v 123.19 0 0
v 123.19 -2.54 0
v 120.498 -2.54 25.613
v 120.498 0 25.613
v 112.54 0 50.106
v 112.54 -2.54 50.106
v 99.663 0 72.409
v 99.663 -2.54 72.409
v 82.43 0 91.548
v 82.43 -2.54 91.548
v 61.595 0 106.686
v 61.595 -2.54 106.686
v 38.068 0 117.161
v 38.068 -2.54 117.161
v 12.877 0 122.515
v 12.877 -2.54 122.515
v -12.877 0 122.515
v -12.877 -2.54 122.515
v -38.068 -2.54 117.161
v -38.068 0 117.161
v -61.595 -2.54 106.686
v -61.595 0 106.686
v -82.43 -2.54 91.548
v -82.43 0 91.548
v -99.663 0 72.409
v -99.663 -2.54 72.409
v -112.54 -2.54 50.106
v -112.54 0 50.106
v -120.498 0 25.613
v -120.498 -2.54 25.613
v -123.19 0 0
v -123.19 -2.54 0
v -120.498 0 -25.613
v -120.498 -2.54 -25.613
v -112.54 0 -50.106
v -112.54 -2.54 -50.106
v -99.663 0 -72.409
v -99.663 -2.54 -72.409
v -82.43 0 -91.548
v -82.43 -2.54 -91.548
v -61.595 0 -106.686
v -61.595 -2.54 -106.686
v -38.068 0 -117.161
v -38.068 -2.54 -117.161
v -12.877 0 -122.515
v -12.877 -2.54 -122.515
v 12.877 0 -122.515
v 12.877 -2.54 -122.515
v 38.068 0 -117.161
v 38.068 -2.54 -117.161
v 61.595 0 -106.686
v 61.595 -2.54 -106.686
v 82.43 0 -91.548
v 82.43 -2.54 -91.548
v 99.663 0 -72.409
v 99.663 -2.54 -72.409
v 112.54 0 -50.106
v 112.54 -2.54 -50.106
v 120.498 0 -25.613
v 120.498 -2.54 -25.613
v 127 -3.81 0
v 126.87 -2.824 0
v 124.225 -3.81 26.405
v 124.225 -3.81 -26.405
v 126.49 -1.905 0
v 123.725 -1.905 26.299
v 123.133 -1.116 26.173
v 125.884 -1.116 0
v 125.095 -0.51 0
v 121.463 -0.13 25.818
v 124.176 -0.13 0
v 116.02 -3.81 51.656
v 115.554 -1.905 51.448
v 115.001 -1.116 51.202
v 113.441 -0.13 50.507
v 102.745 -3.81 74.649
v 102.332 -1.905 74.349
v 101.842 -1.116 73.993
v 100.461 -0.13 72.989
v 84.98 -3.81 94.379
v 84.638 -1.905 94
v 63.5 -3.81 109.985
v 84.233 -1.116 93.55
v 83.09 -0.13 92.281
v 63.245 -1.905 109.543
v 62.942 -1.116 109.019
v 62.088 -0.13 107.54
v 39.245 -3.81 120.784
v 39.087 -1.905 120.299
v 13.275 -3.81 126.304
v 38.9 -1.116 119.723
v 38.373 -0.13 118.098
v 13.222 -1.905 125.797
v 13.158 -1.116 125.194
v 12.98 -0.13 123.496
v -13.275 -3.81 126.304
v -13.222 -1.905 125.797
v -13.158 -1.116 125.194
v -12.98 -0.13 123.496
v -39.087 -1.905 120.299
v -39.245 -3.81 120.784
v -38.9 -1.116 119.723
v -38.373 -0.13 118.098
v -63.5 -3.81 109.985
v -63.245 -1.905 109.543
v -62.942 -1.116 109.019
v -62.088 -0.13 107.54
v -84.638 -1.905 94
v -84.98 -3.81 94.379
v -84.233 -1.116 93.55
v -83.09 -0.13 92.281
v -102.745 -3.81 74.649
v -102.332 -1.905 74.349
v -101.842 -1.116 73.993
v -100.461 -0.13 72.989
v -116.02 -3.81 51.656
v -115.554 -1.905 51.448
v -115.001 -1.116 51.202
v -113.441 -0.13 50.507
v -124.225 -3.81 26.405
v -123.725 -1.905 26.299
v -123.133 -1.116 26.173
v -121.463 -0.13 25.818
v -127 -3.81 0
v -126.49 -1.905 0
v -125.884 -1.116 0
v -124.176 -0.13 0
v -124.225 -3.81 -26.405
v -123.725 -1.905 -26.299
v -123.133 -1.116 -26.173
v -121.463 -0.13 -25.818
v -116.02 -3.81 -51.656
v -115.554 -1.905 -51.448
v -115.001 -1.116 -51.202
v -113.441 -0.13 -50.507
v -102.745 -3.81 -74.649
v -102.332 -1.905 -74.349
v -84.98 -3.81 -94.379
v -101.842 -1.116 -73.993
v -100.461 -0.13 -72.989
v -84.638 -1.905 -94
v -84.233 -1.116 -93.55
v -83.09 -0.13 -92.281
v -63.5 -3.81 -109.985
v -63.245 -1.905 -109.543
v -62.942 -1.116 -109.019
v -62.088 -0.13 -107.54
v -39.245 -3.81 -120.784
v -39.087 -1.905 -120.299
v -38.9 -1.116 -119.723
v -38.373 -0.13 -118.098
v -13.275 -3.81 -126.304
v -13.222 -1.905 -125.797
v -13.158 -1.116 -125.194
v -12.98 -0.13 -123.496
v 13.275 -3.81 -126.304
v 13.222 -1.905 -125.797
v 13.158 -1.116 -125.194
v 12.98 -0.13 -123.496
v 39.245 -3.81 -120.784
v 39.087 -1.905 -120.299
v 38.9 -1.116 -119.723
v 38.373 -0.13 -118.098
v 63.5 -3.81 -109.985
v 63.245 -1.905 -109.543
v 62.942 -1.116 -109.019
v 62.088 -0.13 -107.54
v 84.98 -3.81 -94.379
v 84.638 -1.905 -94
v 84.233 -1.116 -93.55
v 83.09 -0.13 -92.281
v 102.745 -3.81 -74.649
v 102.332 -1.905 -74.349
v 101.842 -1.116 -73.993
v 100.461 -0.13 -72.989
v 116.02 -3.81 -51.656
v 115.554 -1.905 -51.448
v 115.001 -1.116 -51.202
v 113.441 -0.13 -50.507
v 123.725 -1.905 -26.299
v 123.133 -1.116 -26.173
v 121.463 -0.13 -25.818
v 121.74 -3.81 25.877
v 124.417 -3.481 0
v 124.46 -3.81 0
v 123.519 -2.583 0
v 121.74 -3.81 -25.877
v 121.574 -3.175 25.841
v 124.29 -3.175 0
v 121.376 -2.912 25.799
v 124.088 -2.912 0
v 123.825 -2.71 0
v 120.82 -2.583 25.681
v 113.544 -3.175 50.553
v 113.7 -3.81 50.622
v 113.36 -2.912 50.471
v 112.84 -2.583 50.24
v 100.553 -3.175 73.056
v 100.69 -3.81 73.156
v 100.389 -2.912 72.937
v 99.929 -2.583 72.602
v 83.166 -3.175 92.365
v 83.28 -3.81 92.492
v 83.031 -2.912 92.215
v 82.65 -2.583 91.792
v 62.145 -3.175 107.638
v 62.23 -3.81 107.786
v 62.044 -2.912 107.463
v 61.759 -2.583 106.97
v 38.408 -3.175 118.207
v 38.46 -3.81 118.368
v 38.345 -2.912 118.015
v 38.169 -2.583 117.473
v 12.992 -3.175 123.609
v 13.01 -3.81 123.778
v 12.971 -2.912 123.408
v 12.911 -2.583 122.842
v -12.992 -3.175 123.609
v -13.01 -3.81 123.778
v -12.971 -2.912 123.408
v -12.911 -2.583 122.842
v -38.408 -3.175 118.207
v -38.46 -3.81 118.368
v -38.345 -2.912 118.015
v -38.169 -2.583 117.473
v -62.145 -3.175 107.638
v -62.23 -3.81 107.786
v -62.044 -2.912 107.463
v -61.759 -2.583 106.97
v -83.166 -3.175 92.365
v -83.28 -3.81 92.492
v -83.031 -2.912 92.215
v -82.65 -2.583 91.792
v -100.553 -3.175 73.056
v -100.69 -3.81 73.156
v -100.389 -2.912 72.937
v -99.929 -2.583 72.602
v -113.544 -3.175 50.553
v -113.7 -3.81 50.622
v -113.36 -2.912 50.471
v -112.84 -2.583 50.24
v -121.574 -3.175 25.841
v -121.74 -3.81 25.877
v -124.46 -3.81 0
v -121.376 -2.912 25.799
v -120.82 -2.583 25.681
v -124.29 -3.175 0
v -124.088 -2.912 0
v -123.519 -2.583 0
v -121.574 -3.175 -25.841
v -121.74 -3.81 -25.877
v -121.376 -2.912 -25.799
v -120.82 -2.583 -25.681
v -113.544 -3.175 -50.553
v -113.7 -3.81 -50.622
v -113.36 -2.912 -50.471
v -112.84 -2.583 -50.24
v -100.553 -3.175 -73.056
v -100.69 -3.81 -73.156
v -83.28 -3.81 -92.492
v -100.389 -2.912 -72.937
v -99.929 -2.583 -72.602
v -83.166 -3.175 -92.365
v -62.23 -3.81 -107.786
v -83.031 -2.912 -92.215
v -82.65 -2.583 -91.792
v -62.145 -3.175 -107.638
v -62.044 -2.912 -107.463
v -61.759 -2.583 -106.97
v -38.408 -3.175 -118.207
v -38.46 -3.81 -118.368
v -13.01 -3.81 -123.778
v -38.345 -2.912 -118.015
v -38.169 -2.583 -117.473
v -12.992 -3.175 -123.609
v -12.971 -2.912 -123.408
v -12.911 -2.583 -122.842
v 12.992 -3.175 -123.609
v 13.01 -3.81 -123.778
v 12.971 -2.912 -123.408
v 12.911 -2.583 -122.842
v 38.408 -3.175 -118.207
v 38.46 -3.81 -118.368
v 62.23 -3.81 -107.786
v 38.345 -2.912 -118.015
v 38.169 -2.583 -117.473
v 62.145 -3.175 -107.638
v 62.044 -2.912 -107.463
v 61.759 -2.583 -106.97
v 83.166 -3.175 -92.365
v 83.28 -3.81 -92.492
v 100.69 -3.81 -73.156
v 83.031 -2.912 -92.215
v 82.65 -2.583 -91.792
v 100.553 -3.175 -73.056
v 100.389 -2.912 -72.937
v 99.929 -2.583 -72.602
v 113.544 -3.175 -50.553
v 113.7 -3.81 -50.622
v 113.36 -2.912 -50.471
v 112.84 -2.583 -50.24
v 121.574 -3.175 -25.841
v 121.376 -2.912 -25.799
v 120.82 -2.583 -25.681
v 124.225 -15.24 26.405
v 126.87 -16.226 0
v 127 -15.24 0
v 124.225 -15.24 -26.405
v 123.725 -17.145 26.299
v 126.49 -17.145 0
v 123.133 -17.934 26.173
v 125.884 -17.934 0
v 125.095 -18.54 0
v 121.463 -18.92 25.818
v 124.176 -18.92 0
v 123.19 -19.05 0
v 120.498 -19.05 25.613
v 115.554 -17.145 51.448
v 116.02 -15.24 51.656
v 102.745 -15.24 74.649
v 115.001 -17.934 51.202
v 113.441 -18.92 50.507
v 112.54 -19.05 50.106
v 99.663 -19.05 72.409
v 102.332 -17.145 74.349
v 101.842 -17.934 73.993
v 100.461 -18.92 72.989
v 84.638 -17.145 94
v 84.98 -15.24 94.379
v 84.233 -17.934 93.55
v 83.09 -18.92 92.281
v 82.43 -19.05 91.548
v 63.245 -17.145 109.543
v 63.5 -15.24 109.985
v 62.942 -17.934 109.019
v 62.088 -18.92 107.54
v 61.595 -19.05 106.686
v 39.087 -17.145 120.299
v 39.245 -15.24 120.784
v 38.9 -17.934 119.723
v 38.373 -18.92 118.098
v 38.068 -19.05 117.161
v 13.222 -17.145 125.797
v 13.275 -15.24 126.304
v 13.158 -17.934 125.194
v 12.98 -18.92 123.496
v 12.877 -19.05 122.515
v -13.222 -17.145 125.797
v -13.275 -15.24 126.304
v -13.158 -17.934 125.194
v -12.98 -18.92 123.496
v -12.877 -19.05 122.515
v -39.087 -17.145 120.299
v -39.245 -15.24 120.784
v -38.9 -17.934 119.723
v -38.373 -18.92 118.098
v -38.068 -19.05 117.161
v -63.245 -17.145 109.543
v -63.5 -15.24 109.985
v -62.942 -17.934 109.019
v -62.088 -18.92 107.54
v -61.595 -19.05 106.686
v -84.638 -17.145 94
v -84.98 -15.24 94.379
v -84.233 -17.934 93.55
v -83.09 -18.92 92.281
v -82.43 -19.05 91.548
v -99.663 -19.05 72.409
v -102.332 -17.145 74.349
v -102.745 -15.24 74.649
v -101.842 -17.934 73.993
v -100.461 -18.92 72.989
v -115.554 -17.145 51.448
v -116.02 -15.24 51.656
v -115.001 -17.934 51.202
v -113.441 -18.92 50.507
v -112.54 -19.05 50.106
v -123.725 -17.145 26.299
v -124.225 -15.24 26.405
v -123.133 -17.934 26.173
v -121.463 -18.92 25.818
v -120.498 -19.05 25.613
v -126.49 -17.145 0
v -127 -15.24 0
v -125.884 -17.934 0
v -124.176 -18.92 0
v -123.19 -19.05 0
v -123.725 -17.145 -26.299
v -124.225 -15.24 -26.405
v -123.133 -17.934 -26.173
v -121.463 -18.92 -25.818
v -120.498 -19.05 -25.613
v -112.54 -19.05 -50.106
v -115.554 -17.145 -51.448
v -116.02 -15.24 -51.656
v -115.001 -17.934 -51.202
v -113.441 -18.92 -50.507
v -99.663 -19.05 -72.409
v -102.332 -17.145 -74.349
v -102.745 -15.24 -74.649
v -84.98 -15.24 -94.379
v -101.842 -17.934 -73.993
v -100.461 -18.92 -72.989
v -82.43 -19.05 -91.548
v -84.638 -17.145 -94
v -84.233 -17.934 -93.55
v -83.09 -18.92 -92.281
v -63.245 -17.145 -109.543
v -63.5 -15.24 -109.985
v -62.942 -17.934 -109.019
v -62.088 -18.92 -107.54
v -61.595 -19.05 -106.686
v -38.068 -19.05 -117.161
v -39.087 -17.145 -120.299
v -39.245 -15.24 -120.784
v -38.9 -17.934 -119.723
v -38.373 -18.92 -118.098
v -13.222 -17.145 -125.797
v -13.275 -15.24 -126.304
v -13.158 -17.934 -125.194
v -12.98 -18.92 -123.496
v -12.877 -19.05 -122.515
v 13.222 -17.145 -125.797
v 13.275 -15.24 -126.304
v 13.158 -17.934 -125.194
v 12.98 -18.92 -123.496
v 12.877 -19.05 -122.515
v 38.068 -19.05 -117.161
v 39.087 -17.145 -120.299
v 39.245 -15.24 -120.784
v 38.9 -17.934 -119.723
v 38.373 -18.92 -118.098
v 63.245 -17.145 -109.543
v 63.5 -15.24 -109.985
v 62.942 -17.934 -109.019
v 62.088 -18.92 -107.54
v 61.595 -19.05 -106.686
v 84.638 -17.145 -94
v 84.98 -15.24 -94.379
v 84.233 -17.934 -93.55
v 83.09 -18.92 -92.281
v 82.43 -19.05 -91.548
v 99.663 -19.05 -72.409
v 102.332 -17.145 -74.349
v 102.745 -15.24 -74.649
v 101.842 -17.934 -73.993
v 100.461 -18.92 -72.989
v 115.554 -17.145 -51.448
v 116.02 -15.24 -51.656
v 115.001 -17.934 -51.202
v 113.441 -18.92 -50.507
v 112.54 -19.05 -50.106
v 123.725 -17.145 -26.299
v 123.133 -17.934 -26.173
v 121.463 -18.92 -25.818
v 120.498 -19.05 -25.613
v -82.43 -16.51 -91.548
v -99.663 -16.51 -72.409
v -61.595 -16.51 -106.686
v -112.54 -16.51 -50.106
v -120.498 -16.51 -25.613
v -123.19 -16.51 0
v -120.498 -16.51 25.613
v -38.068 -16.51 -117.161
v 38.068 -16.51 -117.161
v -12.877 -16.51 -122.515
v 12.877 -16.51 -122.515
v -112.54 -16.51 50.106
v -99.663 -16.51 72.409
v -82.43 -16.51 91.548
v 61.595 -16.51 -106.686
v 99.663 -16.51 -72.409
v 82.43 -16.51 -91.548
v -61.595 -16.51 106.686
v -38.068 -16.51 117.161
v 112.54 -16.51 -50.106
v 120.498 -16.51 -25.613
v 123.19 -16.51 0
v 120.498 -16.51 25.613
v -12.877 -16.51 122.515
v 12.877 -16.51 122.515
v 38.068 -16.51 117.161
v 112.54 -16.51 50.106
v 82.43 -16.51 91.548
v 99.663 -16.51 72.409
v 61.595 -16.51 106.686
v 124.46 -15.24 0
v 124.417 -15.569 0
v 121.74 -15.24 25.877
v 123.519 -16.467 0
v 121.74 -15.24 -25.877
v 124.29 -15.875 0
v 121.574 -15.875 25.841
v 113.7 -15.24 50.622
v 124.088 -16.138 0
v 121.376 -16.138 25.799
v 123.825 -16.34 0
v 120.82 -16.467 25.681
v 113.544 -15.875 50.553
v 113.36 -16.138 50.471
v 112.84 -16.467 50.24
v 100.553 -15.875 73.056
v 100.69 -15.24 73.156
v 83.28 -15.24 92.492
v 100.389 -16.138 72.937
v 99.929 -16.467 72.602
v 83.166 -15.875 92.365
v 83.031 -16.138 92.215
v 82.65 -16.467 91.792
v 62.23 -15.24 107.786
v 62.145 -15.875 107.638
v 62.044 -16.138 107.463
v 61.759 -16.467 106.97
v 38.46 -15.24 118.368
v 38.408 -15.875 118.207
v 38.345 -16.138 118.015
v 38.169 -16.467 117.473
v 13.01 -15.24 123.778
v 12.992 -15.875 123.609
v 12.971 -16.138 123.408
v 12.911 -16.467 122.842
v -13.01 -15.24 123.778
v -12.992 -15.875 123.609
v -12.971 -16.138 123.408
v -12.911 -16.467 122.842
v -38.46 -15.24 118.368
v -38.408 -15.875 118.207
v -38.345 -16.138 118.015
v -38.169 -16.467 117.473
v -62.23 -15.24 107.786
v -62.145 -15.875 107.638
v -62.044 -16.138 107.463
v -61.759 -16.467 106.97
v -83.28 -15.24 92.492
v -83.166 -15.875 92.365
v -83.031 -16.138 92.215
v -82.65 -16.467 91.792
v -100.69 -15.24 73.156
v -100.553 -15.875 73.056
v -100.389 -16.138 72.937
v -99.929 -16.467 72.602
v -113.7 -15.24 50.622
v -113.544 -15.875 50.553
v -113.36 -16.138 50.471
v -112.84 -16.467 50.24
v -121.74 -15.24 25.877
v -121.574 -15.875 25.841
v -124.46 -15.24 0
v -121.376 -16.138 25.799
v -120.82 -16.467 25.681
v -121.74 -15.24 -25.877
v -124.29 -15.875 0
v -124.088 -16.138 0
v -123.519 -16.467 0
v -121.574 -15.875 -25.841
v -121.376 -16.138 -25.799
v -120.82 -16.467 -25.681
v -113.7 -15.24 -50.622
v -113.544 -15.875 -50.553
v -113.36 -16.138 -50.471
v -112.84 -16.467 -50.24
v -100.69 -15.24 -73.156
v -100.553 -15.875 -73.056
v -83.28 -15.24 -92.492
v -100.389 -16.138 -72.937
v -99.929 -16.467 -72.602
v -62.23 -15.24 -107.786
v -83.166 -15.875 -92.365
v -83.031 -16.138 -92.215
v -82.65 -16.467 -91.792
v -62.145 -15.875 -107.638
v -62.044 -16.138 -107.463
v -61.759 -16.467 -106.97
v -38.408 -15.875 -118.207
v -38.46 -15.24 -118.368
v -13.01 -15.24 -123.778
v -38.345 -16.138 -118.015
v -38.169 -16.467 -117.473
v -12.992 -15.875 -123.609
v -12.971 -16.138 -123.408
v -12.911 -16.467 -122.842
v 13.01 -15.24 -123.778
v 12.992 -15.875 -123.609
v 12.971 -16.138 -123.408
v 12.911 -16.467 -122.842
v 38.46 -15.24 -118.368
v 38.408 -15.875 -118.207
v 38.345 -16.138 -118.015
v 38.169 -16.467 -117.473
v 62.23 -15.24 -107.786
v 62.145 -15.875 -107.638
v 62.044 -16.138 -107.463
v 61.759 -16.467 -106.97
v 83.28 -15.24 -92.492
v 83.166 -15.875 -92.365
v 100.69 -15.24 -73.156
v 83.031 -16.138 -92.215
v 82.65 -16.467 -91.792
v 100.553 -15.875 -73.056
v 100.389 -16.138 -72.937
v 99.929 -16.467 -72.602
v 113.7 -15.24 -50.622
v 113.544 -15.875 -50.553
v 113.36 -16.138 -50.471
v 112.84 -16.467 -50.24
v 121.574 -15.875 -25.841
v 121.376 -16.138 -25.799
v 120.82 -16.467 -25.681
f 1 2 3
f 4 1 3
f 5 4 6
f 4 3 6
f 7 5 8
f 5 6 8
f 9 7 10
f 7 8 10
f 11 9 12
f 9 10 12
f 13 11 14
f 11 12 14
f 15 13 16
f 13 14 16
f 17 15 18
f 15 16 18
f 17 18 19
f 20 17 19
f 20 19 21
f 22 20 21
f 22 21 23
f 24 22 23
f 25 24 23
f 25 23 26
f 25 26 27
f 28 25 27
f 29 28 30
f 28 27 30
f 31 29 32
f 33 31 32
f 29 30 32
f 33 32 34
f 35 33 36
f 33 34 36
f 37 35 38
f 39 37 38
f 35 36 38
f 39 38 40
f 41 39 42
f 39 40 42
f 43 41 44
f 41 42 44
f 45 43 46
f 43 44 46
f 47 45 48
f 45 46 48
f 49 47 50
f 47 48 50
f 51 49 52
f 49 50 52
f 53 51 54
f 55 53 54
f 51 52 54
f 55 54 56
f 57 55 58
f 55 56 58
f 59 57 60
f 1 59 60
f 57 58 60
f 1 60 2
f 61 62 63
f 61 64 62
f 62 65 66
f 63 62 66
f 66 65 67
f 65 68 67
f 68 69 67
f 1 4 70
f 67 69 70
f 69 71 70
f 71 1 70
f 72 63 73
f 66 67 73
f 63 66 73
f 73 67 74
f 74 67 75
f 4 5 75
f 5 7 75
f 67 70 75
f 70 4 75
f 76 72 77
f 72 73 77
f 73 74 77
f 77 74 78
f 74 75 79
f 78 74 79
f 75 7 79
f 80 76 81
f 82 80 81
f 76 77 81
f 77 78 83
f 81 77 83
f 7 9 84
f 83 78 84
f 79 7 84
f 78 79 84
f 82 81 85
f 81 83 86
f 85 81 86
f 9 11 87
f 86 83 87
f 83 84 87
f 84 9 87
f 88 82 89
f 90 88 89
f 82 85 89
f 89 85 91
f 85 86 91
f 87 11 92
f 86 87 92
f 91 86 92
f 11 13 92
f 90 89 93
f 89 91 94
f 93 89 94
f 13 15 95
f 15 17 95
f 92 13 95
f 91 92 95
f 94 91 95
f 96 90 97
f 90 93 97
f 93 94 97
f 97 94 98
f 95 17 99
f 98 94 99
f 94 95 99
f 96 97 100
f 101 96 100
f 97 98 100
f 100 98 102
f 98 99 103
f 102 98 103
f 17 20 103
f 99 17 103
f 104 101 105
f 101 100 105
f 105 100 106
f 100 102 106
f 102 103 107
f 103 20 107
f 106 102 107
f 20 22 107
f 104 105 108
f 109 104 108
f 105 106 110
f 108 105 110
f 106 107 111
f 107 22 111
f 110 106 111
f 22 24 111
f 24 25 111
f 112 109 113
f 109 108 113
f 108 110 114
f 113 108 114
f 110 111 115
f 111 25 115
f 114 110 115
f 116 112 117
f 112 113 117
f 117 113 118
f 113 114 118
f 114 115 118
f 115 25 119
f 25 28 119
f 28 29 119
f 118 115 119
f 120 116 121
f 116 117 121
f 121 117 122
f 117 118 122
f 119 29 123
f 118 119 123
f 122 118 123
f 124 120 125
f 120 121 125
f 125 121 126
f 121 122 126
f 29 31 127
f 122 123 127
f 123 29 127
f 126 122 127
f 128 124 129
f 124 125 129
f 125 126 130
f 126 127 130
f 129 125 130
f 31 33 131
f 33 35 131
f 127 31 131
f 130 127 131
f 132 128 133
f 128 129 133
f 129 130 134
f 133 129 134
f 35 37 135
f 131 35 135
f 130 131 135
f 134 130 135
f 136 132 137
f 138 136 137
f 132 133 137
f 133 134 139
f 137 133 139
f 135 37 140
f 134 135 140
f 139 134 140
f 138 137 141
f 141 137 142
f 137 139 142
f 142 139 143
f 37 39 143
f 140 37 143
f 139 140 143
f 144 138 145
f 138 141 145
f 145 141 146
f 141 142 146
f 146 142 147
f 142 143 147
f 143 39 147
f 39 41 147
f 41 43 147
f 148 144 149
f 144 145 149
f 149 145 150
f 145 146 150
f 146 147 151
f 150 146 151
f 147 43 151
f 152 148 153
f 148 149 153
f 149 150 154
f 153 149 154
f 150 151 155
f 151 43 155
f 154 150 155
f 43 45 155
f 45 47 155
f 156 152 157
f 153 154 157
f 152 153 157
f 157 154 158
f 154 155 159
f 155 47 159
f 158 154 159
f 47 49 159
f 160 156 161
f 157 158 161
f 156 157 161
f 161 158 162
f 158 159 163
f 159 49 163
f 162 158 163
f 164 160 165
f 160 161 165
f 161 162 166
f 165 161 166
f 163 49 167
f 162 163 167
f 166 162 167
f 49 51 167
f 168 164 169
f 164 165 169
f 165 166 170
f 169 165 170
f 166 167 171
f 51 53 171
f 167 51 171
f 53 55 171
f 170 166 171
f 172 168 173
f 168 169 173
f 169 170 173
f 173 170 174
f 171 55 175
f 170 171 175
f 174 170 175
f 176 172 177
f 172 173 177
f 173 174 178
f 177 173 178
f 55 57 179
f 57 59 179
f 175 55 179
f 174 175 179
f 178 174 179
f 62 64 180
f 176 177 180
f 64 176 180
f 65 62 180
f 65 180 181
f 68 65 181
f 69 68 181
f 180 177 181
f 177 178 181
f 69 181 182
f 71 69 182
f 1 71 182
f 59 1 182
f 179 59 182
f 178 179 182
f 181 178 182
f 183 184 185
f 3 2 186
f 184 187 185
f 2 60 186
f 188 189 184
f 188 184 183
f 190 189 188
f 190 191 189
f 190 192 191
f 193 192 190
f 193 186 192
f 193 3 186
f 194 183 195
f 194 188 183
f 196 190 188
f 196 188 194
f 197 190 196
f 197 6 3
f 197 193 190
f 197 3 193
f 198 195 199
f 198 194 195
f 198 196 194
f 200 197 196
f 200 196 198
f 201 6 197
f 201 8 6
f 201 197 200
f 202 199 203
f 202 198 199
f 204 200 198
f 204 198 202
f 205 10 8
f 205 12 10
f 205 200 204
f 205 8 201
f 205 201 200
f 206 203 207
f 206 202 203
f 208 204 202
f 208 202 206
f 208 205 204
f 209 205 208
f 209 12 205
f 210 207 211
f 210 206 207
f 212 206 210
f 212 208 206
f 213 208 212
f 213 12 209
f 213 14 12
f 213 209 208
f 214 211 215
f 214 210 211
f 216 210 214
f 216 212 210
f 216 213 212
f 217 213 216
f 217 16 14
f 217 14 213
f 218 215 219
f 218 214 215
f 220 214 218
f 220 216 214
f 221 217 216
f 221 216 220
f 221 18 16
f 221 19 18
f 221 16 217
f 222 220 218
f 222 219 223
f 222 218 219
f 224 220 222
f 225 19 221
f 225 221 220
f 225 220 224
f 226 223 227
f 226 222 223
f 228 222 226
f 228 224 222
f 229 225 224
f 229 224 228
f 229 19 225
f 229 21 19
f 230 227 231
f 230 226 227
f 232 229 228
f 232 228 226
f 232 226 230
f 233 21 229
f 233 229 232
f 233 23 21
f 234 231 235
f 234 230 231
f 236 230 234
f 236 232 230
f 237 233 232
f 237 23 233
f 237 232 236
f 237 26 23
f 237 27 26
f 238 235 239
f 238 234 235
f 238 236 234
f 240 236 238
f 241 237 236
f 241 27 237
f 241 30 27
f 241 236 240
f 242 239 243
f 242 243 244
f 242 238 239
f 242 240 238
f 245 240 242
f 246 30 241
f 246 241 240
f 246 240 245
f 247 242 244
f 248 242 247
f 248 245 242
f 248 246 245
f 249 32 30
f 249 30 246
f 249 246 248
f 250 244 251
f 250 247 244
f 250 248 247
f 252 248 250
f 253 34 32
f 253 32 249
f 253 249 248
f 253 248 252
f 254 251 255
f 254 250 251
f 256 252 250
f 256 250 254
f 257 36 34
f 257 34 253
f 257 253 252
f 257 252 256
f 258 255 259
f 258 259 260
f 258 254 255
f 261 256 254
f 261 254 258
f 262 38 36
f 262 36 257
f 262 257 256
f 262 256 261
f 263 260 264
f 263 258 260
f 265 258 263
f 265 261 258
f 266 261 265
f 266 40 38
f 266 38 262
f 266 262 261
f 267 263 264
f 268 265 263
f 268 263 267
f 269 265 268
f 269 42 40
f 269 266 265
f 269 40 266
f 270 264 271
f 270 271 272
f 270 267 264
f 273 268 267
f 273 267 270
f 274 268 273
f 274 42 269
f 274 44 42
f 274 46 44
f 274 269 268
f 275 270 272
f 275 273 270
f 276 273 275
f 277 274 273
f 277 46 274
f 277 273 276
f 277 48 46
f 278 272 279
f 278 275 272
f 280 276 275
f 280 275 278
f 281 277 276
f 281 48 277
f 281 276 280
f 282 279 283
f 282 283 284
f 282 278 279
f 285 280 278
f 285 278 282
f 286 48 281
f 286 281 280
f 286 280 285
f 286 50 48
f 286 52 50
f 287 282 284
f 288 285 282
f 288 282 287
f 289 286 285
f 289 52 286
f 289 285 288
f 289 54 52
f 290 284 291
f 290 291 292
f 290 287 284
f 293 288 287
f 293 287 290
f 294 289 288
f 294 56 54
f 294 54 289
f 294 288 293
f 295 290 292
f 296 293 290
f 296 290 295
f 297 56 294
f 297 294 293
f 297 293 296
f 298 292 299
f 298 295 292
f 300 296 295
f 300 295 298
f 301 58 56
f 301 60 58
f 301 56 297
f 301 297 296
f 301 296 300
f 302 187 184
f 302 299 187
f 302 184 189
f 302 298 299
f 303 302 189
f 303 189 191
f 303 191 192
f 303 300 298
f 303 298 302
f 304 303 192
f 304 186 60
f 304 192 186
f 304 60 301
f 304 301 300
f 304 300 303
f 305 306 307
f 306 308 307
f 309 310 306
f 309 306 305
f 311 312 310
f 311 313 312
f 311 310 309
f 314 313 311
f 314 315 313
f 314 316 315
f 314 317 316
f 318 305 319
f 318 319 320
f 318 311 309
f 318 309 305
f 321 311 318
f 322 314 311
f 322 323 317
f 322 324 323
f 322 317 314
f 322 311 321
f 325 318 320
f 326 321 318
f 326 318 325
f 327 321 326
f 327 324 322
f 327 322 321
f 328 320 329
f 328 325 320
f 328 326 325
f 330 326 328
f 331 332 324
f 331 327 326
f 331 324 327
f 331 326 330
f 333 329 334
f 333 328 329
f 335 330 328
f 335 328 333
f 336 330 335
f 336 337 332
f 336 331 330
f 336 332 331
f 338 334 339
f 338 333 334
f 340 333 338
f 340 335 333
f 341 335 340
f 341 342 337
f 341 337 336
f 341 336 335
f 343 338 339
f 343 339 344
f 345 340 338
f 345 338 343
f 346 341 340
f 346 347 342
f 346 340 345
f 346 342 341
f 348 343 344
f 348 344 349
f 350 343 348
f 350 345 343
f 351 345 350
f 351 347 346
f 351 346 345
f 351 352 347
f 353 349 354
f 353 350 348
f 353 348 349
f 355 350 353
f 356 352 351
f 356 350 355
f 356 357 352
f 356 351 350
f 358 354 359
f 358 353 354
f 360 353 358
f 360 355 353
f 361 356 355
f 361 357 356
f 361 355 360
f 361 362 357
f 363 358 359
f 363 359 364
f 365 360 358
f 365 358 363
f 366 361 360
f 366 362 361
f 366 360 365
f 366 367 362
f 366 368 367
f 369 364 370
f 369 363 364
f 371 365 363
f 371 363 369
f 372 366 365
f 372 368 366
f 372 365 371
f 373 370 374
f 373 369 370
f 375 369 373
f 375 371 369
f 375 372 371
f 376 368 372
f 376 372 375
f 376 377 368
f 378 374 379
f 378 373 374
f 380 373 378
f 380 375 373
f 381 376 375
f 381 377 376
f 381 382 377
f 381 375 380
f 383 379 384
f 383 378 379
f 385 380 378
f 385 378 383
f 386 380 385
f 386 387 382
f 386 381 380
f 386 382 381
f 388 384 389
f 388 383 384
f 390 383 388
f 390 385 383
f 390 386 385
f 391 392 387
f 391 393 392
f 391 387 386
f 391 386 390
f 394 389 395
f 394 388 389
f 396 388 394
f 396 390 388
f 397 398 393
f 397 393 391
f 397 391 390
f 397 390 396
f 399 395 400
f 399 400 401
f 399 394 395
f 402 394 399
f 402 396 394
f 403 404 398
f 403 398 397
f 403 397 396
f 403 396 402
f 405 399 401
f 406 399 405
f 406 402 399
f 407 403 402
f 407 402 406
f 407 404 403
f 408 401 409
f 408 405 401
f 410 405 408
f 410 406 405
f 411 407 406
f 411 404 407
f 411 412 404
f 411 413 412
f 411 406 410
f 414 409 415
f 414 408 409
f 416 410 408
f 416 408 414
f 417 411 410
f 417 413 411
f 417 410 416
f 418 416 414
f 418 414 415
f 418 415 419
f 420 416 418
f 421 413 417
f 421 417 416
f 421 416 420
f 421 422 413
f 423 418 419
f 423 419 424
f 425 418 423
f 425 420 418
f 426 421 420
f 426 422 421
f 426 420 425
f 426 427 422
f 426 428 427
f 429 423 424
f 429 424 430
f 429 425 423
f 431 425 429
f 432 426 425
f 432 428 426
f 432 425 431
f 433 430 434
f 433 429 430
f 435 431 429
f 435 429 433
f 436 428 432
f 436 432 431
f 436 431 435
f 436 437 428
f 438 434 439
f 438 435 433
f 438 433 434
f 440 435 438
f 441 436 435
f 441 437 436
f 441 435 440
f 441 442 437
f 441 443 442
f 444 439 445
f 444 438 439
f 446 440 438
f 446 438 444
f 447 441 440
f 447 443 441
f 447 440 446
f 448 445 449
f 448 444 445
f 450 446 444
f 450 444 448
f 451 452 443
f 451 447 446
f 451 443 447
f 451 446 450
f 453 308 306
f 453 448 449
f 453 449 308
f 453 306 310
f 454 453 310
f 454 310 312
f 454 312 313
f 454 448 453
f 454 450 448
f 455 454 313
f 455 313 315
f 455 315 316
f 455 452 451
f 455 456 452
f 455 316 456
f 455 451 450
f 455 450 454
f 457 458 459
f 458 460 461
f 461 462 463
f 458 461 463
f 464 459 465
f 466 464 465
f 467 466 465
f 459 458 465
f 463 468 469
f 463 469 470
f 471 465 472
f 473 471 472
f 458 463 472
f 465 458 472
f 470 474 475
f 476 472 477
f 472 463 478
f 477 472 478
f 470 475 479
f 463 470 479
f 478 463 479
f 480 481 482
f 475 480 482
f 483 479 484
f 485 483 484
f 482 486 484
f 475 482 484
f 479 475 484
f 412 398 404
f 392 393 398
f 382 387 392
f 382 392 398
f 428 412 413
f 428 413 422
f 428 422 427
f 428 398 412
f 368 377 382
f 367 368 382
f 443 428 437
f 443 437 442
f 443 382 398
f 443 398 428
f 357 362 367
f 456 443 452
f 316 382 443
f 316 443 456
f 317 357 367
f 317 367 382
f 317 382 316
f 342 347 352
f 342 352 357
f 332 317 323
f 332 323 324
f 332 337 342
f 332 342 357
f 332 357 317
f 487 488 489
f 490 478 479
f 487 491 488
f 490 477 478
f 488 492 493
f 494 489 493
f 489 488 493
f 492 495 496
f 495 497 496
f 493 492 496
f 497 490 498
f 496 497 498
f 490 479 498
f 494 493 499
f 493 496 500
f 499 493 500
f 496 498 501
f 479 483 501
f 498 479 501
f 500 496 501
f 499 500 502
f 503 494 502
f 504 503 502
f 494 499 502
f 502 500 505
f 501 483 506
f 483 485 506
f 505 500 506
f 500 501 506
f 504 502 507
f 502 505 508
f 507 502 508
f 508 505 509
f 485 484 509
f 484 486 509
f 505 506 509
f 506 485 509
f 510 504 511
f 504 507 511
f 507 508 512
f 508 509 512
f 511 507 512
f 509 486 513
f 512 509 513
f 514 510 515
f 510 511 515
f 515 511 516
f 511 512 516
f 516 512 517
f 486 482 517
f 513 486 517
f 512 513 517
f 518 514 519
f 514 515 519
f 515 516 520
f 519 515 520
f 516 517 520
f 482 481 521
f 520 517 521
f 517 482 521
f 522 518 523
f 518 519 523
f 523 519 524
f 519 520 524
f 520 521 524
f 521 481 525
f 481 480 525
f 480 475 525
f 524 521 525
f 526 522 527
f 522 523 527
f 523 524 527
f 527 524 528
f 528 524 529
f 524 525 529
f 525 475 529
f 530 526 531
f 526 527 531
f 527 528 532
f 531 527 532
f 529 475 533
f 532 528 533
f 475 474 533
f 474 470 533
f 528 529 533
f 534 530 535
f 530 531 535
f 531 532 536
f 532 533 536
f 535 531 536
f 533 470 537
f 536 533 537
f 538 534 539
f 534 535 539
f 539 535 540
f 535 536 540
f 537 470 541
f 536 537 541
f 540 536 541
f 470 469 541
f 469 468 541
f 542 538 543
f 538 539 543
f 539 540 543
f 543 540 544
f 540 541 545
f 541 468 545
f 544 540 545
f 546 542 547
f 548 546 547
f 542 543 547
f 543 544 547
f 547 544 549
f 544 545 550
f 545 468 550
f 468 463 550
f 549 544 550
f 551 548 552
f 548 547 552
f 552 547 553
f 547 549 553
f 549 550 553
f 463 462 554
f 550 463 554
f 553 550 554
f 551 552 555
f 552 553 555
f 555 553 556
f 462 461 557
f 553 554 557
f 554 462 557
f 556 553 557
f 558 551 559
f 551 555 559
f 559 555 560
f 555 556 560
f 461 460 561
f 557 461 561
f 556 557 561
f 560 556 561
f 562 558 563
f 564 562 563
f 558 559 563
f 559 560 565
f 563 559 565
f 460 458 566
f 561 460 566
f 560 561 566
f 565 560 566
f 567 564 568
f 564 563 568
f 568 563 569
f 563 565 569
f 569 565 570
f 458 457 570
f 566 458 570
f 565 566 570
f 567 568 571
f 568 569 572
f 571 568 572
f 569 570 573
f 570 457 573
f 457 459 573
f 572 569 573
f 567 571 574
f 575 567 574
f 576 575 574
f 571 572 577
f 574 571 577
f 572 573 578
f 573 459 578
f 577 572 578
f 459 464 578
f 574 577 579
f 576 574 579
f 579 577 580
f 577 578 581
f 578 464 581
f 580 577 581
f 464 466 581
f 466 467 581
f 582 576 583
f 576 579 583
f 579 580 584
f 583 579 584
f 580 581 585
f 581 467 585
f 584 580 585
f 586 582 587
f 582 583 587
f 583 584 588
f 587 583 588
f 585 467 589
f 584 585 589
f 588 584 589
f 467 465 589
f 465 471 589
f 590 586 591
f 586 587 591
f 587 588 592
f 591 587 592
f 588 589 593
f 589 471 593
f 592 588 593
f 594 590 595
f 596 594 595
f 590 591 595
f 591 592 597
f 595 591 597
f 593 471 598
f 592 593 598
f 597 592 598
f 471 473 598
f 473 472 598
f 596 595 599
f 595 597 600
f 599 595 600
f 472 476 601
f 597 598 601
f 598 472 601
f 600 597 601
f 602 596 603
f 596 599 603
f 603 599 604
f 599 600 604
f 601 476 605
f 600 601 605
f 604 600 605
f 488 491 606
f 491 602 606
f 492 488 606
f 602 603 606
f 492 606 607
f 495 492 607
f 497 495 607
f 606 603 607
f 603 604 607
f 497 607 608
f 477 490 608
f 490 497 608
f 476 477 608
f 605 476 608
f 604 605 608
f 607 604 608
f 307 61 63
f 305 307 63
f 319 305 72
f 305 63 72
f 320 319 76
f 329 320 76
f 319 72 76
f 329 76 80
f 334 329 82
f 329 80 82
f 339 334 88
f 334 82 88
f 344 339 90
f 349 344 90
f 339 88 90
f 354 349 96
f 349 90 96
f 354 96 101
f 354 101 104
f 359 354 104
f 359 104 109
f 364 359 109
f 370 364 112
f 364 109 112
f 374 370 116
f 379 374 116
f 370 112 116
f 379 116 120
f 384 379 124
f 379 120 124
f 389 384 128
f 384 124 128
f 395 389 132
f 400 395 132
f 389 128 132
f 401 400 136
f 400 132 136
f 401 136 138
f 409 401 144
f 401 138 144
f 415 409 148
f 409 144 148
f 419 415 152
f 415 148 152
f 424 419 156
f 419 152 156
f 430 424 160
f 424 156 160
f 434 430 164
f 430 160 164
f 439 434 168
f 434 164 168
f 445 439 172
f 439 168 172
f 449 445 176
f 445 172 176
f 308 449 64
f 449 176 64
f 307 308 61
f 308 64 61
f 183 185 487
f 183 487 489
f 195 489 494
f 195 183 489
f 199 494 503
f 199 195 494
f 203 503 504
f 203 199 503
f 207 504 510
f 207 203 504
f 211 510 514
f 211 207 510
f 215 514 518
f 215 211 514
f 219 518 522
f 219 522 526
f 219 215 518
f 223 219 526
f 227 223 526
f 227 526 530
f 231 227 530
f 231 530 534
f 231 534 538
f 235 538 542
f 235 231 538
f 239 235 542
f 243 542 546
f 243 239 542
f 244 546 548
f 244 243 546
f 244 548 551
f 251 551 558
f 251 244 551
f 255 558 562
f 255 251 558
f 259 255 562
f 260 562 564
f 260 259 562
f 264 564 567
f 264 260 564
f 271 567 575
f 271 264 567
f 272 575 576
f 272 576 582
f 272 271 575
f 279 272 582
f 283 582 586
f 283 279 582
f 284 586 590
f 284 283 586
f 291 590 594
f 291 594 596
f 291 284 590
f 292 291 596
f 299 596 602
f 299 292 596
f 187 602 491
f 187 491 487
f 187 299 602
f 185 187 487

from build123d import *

# Parameters (mm, degrees)
F0_R     = 127
F1_DEPTH = 19.05
F2_R     = 3.81
F3_T     = -2.54


# Not quite as in the source:
# - a shell that OpenCascade refuses in one call is made with other operations: the cavity is built on its own and cut out


with BuildPart() as f1:
    # F0 (on Front) → F1 (new body)
    with BuildSketch(Plane.XZ):
        Circle(F0_R)
    extrude(amount=F1_DEPTH)

    # F2
    f2_edges = [f1.edges().sort_by_distance(p)[0] for p in [
        (-127, 0, 0),
        (-127, -19.05, 0),
    ]]
    fillet(f2_edges, radius=F2_R)

    # F3: a shell. OpenCascade refuses it in one call, so the cavity is built on its own and cut out:
    # the body offset inwards by the wall thickness, plus a prism from it out through each open face.
    f3_core = offset(f1.part, amount=F3_T, mode=Mode.PRIVATE)
    f3_exits = [f3_core.faces().sort_by_distance(p)[0] for p in [
        (0, -2.54, 0),
    ]]
    add(f3_core, mode=Mode.SUBTRACT)
    extrude(f3_exits, amount=-F3_T, mode=Mode.SUBTRACT)


solid = f1.part
